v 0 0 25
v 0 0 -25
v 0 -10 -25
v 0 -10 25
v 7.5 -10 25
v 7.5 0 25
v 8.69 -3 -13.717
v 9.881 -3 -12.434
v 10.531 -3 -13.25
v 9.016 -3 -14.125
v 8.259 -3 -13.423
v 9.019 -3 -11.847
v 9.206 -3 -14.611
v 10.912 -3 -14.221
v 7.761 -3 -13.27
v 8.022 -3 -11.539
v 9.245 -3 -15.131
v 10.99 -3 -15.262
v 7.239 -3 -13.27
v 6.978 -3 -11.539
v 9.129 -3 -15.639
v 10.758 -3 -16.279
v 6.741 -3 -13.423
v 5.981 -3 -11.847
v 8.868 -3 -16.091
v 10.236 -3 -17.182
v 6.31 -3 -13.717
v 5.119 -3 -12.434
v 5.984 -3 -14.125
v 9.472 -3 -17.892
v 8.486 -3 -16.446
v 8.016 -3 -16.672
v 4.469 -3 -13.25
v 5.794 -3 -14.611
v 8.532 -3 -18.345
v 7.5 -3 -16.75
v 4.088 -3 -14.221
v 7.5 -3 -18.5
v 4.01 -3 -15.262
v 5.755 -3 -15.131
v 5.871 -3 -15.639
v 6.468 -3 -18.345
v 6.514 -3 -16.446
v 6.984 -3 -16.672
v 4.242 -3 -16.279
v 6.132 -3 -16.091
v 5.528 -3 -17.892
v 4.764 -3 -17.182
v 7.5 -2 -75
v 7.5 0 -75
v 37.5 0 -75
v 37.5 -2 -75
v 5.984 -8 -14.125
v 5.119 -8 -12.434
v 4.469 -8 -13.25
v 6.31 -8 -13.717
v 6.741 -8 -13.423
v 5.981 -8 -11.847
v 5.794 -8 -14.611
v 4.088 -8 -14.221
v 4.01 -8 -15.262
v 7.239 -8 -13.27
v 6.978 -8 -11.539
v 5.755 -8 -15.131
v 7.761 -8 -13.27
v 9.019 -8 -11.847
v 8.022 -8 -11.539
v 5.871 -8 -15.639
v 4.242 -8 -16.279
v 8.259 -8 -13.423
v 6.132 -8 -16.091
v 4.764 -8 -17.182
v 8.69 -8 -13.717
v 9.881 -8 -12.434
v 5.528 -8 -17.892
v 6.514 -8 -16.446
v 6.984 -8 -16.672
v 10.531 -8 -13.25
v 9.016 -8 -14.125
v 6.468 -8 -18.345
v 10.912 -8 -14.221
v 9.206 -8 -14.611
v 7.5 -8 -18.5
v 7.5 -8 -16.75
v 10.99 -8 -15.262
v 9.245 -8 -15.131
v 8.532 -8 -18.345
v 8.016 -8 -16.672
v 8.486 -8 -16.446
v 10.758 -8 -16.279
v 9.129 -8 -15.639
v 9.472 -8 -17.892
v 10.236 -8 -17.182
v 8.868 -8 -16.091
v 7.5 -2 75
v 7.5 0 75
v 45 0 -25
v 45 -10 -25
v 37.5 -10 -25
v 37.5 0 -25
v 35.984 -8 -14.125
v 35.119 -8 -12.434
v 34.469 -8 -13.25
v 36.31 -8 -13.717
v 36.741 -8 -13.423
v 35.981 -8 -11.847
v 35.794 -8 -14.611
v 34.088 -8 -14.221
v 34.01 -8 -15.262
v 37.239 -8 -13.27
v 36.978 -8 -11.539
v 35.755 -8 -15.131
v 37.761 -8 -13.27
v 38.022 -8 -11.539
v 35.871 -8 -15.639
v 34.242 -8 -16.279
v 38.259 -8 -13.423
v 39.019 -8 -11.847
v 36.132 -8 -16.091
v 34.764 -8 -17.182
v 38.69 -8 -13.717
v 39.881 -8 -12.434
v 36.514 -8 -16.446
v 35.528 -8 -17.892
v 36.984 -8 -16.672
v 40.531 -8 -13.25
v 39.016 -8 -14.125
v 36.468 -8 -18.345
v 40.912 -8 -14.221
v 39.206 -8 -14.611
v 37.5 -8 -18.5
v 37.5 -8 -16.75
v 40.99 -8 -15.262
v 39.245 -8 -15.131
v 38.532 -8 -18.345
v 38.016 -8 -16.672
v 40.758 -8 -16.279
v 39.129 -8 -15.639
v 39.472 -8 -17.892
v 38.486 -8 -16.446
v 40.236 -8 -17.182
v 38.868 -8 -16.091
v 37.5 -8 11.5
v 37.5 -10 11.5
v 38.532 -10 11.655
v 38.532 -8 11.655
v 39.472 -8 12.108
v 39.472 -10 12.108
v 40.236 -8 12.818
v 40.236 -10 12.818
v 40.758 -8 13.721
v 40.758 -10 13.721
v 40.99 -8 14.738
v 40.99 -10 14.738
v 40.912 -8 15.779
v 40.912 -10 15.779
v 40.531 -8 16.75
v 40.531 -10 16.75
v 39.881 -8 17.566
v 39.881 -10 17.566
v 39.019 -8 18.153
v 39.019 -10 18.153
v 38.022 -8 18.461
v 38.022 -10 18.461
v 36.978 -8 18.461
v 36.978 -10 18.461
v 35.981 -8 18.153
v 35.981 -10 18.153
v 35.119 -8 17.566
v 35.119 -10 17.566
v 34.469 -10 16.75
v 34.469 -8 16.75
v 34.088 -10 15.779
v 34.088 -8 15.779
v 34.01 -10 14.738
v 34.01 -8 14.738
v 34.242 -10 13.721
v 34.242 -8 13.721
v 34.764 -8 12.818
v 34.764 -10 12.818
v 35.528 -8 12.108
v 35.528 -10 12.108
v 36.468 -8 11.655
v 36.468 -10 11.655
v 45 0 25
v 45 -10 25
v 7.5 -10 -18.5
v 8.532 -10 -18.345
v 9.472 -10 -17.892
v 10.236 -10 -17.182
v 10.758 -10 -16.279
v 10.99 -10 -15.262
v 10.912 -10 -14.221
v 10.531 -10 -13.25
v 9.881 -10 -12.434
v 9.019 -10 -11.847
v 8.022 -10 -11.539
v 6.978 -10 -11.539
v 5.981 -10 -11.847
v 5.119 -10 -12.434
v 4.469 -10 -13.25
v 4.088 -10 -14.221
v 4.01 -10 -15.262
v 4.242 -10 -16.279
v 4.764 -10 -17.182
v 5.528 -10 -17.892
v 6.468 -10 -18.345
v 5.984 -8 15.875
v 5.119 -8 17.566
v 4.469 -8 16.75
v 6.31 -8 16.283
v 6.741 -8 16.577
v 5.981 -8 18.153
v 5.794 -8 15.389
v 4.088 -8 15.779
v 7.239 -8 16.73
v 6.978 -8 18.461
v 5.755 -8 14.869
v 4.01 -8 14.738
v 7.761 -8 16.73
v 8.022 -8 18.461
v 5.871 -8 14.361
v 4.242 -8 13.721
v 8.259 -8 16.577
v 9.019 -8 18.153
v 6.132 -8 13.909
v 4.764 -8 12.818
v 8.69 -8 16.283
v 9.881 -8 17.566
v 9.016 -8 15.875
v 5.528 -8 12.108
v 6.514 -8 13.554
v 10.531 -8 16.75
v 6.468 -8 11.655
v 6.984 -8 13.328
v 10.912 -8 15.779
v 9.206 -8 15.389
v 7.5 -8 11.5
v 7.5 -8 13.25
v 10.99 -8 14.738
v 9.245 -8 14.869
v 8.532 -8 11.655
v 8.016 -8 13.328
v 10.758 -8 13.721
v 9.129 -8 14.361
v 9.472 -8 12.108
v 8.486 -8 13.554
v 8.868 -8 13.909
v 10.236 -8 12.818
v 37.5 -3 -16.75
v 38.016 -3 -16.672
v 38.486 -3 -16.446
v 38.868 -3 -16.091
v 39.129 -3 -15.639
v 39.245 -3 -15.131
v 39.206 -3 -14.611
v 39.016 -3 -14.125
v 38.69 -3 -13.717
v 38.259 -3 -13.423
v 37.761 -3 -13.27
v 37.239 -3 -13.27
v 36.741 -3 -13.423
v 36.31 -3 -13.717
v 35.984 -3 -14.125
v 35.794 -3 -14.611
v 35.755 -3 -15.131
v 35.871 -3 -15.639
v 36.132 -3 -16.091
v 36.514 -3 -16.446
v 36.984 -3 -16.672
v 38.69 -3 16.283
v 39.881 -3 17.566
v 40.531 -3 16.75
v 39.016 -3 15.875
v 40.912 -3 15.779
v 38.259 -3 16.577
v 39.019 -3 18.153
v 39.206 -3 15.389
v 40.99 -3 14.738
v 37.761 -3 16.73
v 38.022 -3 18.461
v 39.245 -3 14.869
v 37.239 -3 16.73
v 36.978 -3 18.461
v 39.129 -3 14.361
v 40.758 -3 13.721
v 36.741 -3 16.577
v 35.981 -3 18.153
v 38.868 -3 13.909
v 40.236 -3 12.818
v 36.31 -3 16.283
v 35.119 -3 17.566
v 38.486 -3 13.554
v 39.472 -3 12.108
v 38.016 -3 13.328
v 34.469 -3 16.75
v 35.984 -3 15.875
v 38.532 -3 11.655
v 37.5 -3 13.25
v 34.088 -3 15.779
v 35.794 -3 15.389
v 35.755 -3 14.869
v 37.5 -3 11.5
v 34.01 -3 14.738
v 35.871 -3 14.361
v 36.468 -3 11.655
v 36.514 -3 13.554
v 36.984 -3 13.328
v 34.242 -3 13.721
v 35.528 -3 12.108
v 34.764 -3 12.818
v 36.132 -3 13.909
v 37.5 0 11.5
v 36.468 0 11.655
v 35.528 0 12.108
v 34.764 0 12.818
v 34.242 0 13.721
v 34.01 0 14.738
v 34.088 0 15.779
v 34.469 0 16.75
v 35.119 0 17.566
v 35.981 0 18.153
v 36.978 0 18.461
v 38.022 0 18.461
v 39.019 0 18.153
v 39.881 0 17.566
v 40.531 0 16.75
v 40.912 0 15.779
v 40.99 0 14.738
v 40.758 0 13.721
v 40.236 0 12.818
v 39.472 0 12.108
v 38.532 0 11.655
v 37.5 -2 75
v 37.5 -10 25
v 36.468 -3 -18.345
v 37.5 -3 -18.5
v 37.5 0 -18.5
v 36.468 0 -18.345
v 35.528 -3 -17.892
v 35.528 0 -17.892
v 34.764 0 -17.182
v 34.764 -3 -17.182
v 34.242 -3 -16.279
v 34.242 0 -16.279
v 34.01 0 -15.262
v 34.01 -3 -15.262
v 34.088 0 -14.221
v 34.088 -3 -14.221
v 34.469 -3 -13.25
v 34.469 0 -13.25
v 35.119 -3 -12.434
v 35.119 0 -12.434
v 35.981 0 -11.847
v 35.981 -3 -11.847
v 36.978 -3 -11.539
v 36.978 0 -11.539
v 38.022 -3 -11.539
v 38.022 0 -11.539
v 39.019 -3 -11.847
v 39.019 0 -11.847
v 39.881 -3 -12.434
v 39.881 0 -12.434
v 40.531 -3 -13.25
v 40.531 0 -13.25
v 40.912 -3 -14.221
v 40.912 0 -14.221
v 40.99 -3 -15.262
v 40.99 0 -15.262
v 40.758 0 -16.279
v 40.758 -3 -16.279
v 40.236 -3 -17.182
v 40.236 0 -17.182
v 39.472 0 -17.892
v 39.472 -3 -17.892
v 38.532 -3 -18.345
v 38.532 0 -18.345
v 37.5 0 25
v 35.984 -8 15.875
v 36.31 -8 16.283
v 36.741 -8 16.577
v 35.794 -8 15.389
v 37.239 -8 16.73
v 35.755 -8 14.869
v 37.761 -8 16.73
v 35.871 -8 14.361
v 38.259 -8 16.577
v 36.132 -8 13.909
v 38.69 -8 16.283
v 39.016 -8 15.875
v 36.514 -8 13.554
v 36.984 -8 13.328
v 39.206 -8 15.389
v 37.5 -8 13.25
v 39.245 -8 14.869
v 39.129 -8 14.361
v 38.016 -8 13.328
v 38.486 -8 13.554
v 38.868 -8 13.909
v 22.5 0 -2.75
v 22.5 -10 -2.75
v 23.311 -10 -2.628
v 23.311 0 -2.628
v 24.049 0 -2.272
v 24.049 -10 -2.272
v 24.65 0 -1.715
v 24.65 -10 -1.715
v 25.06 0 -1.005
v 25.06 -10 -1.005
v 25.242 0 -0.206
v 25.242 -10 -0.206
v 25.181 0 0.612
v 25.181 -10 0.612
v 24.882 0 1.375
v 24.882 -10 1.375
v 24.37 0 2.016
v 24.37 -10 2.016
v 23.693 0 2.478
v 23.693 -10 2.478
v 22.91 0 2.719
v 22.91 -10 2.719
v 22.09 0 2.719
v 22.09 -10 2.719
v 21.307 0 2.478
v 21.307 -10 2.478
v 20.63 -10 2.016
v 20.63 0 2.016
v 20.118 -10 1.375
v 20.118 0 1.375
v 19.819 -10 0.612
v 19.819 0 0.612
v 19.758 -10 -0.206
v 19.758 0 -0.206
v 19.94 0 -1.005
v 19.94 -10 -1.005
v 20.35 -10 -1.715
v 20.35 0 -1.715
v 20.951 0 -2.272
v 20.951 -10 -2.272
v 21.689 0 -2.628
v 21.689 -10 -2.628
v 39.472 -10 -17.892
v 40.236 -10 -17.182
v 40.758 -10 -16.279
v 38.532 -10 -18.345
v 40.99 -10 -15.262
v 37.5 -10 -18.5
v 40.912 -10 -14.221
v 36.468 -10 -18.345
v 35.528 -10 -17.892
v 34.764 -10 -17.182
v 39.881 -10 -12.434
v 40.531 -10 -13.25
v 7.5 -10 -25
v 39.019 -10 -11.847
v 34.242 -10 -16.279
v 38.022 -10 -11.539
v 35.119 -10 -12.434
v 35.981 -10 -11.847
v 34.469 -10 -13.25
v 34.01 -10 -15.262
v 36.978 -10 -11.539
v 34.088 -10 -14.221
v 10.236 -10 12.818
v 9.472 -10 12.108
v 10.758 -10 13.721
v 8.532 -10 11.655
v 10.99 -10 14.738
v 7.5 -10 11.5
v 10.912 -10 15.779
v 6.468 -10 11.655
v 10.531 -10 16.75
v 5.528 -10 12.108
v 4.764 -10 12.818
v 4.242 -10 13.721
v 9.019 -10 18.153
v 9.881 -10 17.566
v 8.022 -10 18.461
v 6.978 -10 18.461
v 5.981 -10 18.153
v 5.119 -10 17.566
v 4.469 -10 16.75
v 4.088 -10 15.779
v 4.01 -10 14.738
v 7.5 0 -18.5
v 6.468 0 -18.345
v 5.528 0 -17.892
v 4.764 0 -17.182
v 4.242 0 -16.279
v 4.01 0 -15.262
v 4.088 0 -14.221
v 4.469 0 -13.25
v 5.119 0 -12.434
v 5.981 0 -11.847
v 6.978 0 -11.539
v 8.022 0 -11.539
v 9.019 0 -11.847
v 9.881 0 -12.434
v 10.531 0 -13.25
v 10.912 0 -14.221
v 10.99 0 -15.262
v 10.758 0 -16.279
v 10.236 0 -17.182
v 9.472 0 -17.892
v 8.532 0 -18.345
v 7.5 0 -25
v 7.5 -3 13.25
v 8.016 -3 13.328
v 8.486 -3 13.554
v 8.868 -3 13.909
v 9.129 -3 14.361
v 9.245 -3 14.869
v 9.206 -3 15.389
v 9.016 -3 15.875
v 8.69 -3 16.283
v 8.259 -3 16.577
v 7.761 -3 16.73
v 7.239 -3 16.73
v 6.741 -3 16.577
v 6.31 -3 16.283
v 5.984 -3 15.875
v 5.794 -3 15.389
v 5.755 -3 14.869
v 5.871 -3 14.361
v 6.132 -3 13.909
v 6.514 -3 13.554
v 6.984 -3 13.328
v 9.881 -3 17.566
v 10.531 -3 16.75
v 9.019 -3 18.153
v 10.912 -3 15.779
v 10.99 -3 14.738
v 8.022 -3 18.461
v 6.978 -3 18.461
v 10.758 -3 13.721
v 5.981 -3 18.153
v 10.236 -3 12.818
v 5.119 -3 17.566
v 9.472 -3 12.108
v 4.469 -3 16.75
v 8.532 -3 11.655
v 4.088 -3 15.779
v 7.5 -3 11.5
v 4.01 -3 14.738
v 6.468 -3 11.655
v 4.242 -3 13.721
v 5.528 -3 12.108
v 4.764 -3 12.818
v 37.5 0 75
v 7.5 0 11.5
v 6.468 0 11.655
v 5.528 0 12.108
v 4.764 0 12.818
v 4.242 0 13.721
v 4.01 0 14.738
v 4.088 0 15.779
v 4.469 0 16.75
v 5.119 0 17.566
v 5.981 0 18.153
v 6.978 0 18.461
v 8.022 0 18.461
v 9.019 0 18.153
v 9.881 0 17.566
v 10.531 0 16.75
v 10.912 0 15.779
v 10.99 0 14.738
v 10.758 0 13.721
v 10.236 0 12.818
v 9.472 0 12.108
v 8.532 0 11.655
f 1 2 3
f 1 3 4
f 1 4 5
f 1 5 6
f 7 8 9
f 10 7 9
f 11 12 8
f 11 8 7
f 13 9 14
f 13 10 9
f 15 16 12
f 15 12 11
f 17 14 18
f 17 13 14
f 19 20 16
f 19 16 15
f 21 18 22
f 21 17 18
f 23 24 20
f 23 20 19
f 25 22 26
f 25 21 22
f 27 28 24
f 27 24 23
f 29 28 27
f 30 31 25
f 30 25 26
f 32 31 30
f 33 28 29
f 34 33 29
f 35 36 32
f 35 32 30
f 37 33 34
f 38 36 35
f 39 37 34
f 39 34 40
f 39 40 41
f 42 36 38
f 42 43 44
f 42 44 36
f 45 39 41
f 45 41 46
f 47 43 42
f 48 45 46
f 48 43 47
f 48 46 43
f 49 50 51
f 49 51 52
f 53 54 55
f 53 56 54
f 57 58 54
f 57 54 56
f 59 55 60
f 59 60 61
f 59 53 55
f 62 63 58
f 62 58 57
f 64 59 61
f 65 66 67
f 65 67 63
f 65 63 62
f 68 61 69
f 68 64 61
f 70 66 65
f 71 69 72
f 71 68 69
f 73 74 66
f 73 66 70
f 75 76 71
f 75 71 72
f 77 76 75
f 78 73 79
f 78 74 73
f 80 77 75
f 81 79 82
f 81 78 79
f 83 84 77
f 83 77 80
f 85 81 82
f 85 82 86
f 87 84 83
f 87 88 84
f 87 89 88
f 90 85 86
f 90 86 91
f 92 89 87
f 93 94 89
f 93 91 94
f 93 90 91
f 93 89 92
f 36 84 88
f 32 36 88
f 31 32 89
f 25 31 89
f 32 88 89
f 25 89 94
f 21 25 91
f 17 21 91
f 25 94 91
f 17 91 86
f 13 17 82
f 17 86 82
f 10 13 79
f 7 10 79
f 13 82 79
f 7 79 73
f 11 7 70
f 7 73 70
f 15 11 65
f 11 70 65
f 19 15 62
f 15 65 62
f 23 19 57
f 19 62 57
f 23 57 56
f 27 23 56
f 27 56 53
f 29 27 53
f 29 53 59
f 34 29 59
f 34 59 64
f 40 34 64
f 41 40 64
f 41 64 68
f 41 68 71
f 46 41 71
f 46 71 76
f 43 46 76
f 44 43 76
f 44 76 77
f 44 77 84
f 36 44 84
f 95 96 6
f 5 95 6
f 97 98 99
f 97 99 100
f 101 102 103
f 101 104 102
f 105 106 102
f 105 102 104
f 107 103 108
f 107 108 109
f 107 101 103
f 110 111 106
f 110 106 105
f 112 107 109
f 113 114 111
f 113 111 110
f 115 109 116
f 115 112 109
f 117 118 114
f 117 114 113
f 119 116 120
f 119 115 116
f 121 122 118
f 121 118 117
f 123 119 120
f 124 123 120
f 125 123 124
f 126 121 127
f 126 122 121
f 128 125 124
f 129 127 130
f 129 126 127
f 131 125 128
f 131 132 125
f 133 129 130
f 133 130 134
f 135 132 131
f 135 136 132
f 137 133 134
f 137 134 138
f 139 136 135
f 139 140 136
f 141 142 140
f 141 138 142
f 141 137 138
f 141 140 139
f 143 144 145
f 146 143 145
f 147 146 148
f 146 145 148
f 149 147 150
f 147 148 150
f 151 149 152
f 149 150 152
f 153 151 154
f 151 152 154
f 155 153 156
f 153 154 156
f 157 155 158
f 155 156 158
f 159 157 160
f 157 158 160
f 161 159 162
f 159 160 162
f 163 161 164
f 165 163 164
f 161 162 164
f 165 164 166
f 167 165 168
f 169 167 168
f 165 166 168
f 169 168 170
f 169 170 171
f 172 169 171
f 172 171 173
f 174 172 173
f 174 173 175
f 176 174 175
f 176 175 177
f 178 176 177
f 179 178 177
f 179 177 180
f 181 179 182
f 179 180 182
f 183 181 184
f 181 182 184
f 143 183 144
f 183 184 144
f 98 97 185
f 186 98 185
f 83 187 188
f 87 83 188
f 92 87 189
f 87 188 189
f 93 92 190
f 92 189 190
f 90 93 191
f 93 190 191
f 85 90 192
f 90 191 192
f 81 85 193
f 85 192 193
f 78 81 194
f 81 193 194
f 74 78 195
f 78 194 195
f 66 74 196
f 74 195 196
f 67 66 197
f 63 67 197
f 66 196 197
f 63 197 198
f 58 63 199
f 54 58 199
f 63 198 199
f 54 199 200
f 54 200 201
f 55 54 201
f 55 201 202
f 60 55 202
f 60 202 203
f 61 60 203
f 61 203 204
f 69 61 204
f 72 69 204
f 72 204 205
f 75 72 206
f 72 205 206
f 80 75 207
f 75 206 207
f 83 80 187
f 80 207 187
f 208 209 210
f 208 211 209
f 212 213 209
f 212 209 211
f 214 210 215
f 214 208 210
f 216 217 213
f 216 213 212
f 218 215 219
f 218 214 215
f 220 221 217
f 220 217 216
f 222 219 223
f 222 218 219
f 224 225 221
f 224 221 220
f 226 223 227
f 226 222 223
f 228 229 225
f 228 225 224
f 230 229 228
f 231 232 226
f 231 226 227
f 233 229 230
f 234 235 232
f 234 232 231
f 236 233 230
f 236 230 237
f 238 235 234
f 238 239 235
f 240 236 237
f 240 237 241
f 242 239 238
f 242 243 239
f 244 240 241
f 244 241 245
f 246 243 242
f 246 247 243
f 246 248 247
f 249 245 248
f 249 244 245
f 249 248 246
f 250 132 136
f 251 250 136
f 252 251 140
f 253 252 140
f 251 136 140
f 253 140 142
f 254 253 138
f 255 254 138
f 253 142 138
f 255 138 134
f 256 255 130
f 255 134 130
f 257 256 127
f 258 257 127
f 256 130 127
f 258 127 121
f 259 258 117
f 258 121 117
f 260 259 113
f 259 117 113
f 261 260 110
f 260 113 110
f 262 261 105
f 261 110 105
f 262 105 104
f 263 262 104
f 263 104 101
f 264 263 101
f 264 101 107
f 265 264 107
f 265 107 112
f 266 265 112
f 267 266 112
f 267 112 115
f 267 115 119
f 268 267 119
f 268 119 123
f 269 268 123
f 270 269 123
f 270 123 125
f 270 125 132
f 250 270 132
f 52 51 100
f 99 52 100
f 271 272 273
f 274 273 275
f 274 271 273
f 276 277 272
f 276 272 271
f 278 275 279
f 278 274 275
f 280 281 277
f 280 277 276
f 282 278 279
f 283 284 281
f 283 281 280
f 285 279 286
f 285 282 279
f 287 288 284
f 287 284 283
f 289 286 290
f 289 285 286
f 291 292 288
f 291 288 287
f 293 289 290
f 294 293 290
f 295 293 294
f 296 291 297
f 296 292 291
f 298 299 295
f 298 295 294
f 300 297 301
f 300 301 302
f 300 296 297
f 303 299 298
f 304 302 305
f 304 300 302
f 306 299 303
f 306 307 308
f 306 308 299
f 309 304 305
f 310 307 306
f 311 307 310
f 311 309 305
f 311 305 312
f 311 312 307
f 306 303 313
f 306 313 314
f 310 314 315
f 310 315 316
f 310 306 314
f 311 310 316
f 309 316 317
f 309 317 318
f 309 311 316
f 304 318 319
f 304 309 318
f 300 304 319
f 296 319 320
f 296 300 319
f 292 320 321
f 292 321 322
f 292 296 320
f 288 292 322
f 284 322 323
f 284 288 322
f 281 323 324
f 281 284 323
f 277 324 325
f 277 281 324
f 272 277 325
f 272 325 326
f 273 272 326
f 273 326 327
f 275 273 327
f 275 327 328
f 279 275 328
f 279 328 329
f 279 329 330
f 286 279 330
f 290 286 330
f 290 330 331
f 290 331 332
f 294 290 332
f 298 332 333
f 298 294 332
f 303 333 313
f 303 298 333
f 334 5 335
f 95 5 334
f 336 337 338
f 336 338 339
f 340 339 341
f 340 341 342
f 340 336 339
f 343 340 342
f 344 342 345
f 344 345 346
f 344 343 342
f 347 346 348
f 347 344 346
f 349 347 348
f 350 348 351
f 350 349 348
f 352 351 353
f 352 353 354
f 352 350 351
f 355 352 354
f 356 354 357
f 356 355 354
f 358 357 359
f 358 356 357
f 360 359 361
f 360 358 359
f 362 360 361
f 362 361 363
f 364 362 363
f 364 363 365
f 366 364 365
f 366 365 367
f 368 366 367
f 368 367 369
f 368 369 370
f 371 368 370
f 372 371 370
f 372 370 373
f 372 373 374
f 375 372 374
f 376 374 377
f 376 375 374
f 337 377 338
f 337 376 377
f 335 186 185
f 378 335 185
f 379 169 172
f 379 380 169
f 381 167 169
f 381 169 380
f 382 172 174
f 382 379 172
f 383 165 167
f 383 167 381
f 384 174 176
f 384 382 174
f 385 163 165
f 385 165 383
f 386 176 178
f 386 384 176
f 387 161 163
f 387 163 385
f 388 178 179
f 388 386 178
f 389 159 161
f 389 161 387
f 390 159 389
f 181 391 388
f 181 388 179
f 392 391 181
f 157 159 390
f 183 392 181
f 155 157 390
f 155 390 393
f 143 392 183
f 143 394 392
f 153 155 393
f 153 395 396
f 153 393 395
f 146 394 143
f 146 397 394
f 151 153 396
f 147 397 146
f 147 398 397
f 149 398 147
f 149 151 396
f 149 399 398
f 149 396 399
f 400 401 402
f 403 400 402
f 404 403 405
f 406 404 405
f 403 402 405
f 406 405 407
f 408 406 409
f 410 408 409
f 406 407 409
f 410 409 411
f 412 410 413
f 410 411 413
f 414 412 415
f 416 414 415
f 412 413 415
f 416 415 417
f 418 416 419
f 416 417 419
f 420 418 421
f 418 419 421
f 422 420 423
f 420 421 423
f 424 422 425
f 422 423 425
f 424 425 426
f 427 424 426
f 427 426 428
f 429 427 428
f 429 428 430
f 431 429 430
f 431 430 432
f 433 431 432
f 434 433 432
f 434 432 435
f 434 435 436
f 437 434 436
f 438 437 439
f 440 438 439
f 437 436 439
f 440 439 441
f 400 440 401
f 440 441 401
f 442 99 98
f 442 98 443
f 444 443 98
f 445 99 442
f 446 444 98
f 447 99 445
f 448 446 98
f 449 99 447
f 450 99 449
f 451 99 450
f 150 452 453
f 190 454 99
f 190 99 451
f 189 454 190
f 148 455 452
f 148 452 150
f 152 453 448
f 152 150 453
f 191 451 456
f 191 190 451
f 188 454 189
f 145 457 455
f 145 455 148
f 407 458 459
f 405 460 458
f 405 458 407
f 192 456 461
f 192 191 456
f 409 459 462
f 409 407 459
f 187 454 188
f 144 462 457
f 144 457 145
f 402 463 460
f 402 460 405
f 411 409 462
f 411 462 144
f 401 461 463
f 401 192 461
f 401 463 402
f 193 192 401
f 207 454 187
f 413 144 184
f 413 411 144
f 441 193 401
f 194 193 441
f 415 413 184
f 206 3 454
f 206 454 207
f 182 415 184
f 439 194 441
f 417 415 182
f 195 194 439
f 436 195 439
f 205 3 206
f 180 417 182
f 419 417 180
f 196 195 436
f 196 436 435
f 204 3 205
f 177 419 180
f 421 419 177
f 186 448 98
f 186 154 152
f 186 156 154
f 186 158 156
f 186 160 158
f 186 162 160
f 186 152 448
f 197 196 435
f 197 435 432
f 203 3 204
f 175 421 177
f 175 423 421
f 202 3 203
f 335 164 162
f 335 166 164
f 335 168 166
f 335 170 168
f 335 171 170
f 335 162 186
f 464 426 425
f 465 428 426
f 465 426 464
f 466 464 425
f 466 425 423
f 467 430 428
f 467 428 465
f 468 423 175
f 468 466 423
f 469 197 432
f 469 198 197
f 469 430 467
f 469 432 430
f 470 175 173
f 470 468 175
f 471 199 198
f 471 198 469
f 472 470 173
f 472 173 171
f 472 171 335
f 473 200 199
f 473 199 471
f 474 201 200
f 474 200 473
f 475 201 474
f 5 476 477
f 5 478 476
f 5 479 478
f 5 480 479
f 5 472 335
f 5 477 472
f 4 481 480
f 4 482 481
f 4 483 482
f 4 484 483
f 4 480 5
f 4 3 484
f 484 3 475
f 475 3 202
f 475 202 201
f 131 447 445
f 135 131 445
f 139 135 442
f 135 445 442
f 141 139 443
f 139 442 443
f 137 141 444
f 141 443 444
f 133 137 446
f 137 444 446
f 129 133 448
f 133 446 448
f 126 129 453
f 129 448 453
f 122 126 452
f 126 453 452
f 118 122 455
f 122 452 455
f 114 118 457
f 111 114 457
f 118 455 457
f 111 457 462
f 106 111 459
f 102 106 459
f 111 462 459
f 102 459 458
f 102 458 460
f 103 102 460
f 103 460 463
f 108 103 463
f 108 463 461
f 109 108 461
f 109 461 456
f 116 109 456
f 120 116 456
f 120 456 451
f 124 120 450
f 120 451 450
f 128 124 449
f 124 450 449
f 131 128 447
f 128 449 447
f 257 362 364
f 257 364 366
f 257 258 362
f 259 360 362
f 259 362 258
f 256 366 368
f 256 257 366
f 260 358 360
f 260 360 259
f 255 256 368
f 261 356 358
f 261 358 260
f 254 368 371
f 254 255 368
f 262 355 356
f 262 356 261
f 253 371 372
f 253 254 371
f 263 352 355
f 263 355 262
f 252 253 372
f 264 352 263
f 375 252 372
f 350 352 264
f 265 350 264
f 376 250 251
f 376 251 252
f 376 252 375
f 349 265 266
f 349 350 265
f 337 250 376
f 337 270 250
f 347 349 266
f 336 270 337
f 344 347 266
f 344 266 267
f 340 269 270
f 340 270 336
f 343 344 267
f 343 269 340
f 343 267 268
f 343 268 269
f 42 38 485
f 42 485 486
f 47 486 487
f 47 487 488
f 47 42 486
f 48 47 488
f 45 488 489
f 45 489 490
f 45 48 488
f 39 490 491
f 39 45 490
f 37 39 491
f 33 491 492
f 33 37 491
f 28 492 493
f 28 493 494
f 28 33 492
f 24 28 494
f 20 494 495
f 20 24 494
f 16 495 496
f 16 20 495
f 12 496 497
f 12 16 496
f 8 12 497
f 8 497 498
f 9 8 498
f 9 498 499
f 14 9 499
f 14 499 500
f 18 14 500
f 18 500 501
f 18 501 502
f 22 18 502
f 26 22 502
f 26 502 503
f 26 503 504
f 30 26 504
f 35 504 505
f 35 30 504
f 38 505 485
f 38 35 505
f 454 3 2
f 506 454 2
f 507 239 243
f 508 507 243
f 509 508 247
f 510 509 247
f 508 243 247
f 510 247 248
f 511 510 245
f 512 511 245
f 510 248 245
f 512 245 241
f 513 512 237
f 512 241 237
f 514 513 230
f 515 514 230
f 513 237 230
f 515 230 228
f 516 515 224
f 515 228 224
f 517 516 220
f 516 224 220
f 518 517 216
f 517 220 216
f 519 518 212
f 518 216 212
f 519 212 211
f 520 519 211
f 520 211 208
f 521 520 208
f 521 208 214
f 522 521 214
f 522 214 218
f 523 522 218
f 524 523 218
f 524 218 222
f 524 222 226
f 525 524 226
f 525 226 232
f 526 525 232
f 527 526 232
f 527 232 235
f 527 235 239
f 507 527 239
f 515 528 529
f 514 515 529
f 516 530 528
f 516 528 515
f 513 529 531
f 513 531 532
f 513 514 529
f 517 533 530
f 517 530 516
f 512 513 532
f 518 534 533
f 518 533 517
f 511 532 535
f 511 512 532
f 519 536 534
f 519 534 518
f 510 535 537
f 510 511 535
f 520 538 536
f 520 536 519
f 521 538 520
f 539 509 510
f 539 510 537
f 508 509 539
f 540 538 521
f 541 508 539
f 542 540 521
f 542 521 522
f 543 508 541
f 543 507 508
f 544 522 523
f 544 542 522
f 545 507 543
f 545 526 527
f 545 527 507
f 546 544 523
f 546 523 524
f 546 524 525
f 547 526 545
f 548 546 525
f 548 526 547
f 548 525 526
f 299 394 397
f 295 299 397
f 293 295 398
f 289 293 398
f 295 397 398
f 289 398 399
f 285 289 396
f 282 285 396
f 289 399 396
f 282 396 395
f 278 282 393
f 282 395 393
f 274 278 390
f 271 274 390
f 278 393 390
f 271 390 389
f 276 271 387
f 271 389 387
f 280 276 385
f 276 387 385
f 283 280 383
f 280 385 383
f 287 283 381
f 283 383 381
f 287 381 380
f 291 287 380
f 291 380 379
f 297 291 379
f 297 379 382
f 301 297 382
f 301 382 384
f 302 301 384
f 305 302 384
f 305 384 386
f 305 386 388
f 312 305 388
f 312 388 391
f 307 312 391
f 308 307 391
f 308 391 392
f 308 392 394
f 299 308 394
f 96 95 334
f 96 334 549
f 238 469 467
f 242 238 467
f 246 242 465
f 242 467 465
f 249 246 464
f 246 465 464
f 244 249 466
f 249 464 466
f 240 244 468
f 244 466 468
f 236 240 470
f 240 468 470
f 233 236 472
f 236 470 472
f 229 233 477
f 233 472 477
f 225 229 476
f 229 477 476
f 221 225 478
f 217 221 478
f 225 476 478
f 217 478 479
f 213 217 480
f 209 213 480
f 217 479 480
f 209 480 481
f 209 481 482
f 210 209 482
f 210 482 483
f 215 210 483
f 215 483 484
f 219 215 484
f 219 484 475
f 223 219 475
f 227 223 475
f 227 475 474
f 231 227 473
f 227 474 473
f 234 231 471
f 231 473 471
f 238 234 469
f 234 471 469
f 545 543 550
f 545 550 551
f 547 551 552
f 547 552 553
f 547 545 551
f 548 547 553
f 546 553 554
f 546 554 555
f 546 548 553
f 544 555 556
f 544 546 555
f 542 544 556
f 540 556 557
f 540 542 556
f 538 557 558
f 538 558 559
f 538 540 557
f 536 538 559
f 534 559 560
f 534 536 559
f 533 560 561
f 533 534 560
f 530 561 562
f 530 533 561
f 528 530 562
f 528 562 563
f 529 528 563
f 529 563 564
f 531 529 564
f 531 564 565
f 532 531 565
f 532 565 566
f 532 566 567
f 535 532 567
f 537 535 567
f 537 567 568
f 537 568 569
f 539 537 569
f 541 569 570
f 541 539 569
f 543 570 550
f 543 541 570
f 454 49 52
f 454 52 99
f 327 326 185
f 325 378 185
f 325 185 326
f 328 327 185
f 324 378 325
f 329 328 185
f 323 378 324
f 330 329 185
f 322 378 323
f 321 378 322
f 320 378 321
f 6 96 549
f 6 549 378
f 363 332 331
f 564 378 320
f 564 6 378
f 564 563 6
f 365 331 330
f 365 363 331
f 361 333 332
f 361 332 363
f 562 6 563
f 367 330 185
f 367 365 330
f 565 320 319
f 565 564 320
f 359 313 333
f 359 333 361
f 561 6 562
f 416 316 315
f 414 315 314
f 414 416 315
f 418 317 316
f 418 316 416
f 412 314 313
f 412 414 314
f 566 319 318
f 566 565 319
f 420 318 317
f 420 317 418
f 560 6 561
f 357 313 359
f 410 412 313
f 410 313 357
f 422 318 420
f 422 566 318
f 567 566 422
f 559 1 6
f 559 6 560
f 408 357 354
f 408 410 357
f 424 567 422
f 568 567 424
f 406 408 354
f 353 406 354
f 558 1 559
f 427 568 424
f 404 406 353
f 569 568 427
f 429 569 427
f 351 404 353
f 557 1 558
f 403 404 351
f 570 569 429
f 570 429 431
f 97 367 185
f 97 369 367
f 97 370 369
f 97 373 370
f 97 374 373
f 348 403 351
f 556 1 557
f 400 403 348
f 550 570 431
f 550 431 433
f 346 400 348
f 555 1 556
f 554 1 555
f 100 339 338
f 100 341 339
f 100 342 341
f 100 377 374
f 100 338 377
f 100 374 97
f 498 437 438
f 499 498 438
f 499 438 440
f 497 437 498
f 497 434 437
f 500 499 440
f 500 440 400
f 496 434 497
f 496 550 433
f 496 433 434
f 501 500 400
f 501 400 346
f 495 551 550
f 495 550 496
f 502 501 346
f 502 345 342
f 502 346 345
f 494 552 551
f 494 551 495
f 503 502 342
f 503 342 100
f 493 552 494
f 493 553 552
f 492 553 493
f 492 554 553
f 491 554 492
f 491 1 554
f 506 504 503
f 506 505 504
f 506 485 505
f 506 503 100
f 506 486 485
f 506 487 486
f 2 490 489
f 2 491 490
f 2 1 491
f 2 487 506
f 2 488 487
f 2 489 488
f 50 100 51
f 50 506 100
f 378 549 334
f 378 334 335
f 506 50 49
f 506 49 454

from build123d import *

# Parameters (mm, degrees)
BOSS_EXTRUDE1_DEPTH = 45
SKETCH3_R           = 3.5
CUT_EXTRUDE1_DEPTH  = 2
SKETCH4_R           = 1.75
CUT_EXTRUDE2_DEPTH  = 8
CUT_EXTRUDE3_START  = -3
SKETCH5_R           = 3.5
CUT_EXTRUDE3_DEPTH  = 3
CUT_EXTRUDE4_DEPTH  = 7.5
SKETCH8_R           = 2.75
CUT_EXTRUDE5_DEPTH  = 10


with BuildPart() as part:
    # Sketch2 → Boss-Extrude1 (new body)
    with BuildSketch(Plane(origin=(0, 0, 0), x_dir=(0, 0, -1), z_dir=(1, 0, 0))):
        Polygon((-75, 0), (75, 0), (75, -2), (25, -10), (-25, -10), (-75, -2), align=None)
    extrude(amount=BOSS_EXTRUDE1_DEPTH)

    # Sketch3 → Cut-Extrude1 (cut)
    with BuildSketch(Plane.XZ.offset(10)):
        with Locations(Location((7.5, 15, 0), (0, 0, 270))):
            Circle(SKETCH3_R)
        with Locations(Location((37.5, 15, 0), (0, 0, 270))):
            Circle(SKETCH3_R)
        with Locations(Location((37.5, -15, 0), (0, 0, 270))):
            Circle(SKETCH3_R)
        with Locations(Location((7.5, -15, 0), (0, 0, 270))):
            Circle(SKETCH3_R)
    extrude(amount=-CUT_EXTRUDE1_DEPTH, mode=Mode.SUBTRACT)

    # Sketch4 → Cut-Extrude2 (cut)
    with BuildSketch(Plane.XZ.offset(8)):
        with Locations(Location((7.5, 15, 0), (0, 0, 270))):
            Circle(SKETCH4_R)
        with Locations(Location((7.5, -15, 0), (0, 0, 270))):
            Circle(SKETCH4_R)
        with Locations(Location((37.5, -15, 0), (0, 0, 270))):
            Circle(SKETCH4_R)
        with Locations(Location((37.5, 15, 0), (0, 0, 270))):
            Circle(SKETCH4_R)
    extrude(amount=-CUT_EXTRUDE2_DEPTH, mode=Mode.SUBTRACT)

    # Sketch5 → Cut-Extrude3 (cut)
    with BuildSketch(Plane(origin=(0, 0, 0), x_dir=(1, 0, 0), z_dir=(0, 1, 0)).offset(CUT_EXTRUDE3_START)):
        with Locations(Location((7.5, 15, 0), (0, 0, 90))):
            Circle(SKETCH5_R)
        with Locations(Location((37.5, 15, 0), (0, 0, 90))):
            Circle(SKETCH5_R)
        with Locations(Location((7.5, -15, 0), (0, 0, 90))):
            Circle(SKETCH5_R)
        with Locations(Location((37.5, -15, 0), (0, 0, 90))):
            Circle(SKETCH5_R)
    extrude(amount=CUT_EXTRUDE3_DEPTH, mode=Mode.SUBTRACT)

    # Sketch6 → Cut-Extrude4 (cut)
    with BuildSketch(Plane(origin=(45, 0, 0), x_dir=(0, 0, -1), z_dir=(1, 0, 0))):
        Polygon((25, -10), (25, 0), (75, 0), (75, -2), align=None)
        Polygon((-25, -10), (-25, 0), (-75, 0), (-75, -2), align=None)
    cut_extrude4 = extrude(amount=-CUT_EXTRUDE4_DEPTH, mode=Mode.SUBTRACT)

    # Mirror1: Cut-Extrude4 across plane
    add(cut_extrude4.mirror(Plane(origin=(22.5, 0, 0), x_dir=(0, 0, 1), z_dir=(1, 0, 0))), mode=Mode.SUBTRACT)

    # Sketch8 → Cut-Extrude5 (cut)
    with BuildSketch(Plane.XZ.offset(10)):
        with Locations(Location((22.5, 0, 0), (0, 0, 270))):
            Circle(SKETCH8_R)
    extrude(amount=-CUT_EXTRUDE5_DEPTH, mode=Mode.SUBTRACT)


solid = part.part
